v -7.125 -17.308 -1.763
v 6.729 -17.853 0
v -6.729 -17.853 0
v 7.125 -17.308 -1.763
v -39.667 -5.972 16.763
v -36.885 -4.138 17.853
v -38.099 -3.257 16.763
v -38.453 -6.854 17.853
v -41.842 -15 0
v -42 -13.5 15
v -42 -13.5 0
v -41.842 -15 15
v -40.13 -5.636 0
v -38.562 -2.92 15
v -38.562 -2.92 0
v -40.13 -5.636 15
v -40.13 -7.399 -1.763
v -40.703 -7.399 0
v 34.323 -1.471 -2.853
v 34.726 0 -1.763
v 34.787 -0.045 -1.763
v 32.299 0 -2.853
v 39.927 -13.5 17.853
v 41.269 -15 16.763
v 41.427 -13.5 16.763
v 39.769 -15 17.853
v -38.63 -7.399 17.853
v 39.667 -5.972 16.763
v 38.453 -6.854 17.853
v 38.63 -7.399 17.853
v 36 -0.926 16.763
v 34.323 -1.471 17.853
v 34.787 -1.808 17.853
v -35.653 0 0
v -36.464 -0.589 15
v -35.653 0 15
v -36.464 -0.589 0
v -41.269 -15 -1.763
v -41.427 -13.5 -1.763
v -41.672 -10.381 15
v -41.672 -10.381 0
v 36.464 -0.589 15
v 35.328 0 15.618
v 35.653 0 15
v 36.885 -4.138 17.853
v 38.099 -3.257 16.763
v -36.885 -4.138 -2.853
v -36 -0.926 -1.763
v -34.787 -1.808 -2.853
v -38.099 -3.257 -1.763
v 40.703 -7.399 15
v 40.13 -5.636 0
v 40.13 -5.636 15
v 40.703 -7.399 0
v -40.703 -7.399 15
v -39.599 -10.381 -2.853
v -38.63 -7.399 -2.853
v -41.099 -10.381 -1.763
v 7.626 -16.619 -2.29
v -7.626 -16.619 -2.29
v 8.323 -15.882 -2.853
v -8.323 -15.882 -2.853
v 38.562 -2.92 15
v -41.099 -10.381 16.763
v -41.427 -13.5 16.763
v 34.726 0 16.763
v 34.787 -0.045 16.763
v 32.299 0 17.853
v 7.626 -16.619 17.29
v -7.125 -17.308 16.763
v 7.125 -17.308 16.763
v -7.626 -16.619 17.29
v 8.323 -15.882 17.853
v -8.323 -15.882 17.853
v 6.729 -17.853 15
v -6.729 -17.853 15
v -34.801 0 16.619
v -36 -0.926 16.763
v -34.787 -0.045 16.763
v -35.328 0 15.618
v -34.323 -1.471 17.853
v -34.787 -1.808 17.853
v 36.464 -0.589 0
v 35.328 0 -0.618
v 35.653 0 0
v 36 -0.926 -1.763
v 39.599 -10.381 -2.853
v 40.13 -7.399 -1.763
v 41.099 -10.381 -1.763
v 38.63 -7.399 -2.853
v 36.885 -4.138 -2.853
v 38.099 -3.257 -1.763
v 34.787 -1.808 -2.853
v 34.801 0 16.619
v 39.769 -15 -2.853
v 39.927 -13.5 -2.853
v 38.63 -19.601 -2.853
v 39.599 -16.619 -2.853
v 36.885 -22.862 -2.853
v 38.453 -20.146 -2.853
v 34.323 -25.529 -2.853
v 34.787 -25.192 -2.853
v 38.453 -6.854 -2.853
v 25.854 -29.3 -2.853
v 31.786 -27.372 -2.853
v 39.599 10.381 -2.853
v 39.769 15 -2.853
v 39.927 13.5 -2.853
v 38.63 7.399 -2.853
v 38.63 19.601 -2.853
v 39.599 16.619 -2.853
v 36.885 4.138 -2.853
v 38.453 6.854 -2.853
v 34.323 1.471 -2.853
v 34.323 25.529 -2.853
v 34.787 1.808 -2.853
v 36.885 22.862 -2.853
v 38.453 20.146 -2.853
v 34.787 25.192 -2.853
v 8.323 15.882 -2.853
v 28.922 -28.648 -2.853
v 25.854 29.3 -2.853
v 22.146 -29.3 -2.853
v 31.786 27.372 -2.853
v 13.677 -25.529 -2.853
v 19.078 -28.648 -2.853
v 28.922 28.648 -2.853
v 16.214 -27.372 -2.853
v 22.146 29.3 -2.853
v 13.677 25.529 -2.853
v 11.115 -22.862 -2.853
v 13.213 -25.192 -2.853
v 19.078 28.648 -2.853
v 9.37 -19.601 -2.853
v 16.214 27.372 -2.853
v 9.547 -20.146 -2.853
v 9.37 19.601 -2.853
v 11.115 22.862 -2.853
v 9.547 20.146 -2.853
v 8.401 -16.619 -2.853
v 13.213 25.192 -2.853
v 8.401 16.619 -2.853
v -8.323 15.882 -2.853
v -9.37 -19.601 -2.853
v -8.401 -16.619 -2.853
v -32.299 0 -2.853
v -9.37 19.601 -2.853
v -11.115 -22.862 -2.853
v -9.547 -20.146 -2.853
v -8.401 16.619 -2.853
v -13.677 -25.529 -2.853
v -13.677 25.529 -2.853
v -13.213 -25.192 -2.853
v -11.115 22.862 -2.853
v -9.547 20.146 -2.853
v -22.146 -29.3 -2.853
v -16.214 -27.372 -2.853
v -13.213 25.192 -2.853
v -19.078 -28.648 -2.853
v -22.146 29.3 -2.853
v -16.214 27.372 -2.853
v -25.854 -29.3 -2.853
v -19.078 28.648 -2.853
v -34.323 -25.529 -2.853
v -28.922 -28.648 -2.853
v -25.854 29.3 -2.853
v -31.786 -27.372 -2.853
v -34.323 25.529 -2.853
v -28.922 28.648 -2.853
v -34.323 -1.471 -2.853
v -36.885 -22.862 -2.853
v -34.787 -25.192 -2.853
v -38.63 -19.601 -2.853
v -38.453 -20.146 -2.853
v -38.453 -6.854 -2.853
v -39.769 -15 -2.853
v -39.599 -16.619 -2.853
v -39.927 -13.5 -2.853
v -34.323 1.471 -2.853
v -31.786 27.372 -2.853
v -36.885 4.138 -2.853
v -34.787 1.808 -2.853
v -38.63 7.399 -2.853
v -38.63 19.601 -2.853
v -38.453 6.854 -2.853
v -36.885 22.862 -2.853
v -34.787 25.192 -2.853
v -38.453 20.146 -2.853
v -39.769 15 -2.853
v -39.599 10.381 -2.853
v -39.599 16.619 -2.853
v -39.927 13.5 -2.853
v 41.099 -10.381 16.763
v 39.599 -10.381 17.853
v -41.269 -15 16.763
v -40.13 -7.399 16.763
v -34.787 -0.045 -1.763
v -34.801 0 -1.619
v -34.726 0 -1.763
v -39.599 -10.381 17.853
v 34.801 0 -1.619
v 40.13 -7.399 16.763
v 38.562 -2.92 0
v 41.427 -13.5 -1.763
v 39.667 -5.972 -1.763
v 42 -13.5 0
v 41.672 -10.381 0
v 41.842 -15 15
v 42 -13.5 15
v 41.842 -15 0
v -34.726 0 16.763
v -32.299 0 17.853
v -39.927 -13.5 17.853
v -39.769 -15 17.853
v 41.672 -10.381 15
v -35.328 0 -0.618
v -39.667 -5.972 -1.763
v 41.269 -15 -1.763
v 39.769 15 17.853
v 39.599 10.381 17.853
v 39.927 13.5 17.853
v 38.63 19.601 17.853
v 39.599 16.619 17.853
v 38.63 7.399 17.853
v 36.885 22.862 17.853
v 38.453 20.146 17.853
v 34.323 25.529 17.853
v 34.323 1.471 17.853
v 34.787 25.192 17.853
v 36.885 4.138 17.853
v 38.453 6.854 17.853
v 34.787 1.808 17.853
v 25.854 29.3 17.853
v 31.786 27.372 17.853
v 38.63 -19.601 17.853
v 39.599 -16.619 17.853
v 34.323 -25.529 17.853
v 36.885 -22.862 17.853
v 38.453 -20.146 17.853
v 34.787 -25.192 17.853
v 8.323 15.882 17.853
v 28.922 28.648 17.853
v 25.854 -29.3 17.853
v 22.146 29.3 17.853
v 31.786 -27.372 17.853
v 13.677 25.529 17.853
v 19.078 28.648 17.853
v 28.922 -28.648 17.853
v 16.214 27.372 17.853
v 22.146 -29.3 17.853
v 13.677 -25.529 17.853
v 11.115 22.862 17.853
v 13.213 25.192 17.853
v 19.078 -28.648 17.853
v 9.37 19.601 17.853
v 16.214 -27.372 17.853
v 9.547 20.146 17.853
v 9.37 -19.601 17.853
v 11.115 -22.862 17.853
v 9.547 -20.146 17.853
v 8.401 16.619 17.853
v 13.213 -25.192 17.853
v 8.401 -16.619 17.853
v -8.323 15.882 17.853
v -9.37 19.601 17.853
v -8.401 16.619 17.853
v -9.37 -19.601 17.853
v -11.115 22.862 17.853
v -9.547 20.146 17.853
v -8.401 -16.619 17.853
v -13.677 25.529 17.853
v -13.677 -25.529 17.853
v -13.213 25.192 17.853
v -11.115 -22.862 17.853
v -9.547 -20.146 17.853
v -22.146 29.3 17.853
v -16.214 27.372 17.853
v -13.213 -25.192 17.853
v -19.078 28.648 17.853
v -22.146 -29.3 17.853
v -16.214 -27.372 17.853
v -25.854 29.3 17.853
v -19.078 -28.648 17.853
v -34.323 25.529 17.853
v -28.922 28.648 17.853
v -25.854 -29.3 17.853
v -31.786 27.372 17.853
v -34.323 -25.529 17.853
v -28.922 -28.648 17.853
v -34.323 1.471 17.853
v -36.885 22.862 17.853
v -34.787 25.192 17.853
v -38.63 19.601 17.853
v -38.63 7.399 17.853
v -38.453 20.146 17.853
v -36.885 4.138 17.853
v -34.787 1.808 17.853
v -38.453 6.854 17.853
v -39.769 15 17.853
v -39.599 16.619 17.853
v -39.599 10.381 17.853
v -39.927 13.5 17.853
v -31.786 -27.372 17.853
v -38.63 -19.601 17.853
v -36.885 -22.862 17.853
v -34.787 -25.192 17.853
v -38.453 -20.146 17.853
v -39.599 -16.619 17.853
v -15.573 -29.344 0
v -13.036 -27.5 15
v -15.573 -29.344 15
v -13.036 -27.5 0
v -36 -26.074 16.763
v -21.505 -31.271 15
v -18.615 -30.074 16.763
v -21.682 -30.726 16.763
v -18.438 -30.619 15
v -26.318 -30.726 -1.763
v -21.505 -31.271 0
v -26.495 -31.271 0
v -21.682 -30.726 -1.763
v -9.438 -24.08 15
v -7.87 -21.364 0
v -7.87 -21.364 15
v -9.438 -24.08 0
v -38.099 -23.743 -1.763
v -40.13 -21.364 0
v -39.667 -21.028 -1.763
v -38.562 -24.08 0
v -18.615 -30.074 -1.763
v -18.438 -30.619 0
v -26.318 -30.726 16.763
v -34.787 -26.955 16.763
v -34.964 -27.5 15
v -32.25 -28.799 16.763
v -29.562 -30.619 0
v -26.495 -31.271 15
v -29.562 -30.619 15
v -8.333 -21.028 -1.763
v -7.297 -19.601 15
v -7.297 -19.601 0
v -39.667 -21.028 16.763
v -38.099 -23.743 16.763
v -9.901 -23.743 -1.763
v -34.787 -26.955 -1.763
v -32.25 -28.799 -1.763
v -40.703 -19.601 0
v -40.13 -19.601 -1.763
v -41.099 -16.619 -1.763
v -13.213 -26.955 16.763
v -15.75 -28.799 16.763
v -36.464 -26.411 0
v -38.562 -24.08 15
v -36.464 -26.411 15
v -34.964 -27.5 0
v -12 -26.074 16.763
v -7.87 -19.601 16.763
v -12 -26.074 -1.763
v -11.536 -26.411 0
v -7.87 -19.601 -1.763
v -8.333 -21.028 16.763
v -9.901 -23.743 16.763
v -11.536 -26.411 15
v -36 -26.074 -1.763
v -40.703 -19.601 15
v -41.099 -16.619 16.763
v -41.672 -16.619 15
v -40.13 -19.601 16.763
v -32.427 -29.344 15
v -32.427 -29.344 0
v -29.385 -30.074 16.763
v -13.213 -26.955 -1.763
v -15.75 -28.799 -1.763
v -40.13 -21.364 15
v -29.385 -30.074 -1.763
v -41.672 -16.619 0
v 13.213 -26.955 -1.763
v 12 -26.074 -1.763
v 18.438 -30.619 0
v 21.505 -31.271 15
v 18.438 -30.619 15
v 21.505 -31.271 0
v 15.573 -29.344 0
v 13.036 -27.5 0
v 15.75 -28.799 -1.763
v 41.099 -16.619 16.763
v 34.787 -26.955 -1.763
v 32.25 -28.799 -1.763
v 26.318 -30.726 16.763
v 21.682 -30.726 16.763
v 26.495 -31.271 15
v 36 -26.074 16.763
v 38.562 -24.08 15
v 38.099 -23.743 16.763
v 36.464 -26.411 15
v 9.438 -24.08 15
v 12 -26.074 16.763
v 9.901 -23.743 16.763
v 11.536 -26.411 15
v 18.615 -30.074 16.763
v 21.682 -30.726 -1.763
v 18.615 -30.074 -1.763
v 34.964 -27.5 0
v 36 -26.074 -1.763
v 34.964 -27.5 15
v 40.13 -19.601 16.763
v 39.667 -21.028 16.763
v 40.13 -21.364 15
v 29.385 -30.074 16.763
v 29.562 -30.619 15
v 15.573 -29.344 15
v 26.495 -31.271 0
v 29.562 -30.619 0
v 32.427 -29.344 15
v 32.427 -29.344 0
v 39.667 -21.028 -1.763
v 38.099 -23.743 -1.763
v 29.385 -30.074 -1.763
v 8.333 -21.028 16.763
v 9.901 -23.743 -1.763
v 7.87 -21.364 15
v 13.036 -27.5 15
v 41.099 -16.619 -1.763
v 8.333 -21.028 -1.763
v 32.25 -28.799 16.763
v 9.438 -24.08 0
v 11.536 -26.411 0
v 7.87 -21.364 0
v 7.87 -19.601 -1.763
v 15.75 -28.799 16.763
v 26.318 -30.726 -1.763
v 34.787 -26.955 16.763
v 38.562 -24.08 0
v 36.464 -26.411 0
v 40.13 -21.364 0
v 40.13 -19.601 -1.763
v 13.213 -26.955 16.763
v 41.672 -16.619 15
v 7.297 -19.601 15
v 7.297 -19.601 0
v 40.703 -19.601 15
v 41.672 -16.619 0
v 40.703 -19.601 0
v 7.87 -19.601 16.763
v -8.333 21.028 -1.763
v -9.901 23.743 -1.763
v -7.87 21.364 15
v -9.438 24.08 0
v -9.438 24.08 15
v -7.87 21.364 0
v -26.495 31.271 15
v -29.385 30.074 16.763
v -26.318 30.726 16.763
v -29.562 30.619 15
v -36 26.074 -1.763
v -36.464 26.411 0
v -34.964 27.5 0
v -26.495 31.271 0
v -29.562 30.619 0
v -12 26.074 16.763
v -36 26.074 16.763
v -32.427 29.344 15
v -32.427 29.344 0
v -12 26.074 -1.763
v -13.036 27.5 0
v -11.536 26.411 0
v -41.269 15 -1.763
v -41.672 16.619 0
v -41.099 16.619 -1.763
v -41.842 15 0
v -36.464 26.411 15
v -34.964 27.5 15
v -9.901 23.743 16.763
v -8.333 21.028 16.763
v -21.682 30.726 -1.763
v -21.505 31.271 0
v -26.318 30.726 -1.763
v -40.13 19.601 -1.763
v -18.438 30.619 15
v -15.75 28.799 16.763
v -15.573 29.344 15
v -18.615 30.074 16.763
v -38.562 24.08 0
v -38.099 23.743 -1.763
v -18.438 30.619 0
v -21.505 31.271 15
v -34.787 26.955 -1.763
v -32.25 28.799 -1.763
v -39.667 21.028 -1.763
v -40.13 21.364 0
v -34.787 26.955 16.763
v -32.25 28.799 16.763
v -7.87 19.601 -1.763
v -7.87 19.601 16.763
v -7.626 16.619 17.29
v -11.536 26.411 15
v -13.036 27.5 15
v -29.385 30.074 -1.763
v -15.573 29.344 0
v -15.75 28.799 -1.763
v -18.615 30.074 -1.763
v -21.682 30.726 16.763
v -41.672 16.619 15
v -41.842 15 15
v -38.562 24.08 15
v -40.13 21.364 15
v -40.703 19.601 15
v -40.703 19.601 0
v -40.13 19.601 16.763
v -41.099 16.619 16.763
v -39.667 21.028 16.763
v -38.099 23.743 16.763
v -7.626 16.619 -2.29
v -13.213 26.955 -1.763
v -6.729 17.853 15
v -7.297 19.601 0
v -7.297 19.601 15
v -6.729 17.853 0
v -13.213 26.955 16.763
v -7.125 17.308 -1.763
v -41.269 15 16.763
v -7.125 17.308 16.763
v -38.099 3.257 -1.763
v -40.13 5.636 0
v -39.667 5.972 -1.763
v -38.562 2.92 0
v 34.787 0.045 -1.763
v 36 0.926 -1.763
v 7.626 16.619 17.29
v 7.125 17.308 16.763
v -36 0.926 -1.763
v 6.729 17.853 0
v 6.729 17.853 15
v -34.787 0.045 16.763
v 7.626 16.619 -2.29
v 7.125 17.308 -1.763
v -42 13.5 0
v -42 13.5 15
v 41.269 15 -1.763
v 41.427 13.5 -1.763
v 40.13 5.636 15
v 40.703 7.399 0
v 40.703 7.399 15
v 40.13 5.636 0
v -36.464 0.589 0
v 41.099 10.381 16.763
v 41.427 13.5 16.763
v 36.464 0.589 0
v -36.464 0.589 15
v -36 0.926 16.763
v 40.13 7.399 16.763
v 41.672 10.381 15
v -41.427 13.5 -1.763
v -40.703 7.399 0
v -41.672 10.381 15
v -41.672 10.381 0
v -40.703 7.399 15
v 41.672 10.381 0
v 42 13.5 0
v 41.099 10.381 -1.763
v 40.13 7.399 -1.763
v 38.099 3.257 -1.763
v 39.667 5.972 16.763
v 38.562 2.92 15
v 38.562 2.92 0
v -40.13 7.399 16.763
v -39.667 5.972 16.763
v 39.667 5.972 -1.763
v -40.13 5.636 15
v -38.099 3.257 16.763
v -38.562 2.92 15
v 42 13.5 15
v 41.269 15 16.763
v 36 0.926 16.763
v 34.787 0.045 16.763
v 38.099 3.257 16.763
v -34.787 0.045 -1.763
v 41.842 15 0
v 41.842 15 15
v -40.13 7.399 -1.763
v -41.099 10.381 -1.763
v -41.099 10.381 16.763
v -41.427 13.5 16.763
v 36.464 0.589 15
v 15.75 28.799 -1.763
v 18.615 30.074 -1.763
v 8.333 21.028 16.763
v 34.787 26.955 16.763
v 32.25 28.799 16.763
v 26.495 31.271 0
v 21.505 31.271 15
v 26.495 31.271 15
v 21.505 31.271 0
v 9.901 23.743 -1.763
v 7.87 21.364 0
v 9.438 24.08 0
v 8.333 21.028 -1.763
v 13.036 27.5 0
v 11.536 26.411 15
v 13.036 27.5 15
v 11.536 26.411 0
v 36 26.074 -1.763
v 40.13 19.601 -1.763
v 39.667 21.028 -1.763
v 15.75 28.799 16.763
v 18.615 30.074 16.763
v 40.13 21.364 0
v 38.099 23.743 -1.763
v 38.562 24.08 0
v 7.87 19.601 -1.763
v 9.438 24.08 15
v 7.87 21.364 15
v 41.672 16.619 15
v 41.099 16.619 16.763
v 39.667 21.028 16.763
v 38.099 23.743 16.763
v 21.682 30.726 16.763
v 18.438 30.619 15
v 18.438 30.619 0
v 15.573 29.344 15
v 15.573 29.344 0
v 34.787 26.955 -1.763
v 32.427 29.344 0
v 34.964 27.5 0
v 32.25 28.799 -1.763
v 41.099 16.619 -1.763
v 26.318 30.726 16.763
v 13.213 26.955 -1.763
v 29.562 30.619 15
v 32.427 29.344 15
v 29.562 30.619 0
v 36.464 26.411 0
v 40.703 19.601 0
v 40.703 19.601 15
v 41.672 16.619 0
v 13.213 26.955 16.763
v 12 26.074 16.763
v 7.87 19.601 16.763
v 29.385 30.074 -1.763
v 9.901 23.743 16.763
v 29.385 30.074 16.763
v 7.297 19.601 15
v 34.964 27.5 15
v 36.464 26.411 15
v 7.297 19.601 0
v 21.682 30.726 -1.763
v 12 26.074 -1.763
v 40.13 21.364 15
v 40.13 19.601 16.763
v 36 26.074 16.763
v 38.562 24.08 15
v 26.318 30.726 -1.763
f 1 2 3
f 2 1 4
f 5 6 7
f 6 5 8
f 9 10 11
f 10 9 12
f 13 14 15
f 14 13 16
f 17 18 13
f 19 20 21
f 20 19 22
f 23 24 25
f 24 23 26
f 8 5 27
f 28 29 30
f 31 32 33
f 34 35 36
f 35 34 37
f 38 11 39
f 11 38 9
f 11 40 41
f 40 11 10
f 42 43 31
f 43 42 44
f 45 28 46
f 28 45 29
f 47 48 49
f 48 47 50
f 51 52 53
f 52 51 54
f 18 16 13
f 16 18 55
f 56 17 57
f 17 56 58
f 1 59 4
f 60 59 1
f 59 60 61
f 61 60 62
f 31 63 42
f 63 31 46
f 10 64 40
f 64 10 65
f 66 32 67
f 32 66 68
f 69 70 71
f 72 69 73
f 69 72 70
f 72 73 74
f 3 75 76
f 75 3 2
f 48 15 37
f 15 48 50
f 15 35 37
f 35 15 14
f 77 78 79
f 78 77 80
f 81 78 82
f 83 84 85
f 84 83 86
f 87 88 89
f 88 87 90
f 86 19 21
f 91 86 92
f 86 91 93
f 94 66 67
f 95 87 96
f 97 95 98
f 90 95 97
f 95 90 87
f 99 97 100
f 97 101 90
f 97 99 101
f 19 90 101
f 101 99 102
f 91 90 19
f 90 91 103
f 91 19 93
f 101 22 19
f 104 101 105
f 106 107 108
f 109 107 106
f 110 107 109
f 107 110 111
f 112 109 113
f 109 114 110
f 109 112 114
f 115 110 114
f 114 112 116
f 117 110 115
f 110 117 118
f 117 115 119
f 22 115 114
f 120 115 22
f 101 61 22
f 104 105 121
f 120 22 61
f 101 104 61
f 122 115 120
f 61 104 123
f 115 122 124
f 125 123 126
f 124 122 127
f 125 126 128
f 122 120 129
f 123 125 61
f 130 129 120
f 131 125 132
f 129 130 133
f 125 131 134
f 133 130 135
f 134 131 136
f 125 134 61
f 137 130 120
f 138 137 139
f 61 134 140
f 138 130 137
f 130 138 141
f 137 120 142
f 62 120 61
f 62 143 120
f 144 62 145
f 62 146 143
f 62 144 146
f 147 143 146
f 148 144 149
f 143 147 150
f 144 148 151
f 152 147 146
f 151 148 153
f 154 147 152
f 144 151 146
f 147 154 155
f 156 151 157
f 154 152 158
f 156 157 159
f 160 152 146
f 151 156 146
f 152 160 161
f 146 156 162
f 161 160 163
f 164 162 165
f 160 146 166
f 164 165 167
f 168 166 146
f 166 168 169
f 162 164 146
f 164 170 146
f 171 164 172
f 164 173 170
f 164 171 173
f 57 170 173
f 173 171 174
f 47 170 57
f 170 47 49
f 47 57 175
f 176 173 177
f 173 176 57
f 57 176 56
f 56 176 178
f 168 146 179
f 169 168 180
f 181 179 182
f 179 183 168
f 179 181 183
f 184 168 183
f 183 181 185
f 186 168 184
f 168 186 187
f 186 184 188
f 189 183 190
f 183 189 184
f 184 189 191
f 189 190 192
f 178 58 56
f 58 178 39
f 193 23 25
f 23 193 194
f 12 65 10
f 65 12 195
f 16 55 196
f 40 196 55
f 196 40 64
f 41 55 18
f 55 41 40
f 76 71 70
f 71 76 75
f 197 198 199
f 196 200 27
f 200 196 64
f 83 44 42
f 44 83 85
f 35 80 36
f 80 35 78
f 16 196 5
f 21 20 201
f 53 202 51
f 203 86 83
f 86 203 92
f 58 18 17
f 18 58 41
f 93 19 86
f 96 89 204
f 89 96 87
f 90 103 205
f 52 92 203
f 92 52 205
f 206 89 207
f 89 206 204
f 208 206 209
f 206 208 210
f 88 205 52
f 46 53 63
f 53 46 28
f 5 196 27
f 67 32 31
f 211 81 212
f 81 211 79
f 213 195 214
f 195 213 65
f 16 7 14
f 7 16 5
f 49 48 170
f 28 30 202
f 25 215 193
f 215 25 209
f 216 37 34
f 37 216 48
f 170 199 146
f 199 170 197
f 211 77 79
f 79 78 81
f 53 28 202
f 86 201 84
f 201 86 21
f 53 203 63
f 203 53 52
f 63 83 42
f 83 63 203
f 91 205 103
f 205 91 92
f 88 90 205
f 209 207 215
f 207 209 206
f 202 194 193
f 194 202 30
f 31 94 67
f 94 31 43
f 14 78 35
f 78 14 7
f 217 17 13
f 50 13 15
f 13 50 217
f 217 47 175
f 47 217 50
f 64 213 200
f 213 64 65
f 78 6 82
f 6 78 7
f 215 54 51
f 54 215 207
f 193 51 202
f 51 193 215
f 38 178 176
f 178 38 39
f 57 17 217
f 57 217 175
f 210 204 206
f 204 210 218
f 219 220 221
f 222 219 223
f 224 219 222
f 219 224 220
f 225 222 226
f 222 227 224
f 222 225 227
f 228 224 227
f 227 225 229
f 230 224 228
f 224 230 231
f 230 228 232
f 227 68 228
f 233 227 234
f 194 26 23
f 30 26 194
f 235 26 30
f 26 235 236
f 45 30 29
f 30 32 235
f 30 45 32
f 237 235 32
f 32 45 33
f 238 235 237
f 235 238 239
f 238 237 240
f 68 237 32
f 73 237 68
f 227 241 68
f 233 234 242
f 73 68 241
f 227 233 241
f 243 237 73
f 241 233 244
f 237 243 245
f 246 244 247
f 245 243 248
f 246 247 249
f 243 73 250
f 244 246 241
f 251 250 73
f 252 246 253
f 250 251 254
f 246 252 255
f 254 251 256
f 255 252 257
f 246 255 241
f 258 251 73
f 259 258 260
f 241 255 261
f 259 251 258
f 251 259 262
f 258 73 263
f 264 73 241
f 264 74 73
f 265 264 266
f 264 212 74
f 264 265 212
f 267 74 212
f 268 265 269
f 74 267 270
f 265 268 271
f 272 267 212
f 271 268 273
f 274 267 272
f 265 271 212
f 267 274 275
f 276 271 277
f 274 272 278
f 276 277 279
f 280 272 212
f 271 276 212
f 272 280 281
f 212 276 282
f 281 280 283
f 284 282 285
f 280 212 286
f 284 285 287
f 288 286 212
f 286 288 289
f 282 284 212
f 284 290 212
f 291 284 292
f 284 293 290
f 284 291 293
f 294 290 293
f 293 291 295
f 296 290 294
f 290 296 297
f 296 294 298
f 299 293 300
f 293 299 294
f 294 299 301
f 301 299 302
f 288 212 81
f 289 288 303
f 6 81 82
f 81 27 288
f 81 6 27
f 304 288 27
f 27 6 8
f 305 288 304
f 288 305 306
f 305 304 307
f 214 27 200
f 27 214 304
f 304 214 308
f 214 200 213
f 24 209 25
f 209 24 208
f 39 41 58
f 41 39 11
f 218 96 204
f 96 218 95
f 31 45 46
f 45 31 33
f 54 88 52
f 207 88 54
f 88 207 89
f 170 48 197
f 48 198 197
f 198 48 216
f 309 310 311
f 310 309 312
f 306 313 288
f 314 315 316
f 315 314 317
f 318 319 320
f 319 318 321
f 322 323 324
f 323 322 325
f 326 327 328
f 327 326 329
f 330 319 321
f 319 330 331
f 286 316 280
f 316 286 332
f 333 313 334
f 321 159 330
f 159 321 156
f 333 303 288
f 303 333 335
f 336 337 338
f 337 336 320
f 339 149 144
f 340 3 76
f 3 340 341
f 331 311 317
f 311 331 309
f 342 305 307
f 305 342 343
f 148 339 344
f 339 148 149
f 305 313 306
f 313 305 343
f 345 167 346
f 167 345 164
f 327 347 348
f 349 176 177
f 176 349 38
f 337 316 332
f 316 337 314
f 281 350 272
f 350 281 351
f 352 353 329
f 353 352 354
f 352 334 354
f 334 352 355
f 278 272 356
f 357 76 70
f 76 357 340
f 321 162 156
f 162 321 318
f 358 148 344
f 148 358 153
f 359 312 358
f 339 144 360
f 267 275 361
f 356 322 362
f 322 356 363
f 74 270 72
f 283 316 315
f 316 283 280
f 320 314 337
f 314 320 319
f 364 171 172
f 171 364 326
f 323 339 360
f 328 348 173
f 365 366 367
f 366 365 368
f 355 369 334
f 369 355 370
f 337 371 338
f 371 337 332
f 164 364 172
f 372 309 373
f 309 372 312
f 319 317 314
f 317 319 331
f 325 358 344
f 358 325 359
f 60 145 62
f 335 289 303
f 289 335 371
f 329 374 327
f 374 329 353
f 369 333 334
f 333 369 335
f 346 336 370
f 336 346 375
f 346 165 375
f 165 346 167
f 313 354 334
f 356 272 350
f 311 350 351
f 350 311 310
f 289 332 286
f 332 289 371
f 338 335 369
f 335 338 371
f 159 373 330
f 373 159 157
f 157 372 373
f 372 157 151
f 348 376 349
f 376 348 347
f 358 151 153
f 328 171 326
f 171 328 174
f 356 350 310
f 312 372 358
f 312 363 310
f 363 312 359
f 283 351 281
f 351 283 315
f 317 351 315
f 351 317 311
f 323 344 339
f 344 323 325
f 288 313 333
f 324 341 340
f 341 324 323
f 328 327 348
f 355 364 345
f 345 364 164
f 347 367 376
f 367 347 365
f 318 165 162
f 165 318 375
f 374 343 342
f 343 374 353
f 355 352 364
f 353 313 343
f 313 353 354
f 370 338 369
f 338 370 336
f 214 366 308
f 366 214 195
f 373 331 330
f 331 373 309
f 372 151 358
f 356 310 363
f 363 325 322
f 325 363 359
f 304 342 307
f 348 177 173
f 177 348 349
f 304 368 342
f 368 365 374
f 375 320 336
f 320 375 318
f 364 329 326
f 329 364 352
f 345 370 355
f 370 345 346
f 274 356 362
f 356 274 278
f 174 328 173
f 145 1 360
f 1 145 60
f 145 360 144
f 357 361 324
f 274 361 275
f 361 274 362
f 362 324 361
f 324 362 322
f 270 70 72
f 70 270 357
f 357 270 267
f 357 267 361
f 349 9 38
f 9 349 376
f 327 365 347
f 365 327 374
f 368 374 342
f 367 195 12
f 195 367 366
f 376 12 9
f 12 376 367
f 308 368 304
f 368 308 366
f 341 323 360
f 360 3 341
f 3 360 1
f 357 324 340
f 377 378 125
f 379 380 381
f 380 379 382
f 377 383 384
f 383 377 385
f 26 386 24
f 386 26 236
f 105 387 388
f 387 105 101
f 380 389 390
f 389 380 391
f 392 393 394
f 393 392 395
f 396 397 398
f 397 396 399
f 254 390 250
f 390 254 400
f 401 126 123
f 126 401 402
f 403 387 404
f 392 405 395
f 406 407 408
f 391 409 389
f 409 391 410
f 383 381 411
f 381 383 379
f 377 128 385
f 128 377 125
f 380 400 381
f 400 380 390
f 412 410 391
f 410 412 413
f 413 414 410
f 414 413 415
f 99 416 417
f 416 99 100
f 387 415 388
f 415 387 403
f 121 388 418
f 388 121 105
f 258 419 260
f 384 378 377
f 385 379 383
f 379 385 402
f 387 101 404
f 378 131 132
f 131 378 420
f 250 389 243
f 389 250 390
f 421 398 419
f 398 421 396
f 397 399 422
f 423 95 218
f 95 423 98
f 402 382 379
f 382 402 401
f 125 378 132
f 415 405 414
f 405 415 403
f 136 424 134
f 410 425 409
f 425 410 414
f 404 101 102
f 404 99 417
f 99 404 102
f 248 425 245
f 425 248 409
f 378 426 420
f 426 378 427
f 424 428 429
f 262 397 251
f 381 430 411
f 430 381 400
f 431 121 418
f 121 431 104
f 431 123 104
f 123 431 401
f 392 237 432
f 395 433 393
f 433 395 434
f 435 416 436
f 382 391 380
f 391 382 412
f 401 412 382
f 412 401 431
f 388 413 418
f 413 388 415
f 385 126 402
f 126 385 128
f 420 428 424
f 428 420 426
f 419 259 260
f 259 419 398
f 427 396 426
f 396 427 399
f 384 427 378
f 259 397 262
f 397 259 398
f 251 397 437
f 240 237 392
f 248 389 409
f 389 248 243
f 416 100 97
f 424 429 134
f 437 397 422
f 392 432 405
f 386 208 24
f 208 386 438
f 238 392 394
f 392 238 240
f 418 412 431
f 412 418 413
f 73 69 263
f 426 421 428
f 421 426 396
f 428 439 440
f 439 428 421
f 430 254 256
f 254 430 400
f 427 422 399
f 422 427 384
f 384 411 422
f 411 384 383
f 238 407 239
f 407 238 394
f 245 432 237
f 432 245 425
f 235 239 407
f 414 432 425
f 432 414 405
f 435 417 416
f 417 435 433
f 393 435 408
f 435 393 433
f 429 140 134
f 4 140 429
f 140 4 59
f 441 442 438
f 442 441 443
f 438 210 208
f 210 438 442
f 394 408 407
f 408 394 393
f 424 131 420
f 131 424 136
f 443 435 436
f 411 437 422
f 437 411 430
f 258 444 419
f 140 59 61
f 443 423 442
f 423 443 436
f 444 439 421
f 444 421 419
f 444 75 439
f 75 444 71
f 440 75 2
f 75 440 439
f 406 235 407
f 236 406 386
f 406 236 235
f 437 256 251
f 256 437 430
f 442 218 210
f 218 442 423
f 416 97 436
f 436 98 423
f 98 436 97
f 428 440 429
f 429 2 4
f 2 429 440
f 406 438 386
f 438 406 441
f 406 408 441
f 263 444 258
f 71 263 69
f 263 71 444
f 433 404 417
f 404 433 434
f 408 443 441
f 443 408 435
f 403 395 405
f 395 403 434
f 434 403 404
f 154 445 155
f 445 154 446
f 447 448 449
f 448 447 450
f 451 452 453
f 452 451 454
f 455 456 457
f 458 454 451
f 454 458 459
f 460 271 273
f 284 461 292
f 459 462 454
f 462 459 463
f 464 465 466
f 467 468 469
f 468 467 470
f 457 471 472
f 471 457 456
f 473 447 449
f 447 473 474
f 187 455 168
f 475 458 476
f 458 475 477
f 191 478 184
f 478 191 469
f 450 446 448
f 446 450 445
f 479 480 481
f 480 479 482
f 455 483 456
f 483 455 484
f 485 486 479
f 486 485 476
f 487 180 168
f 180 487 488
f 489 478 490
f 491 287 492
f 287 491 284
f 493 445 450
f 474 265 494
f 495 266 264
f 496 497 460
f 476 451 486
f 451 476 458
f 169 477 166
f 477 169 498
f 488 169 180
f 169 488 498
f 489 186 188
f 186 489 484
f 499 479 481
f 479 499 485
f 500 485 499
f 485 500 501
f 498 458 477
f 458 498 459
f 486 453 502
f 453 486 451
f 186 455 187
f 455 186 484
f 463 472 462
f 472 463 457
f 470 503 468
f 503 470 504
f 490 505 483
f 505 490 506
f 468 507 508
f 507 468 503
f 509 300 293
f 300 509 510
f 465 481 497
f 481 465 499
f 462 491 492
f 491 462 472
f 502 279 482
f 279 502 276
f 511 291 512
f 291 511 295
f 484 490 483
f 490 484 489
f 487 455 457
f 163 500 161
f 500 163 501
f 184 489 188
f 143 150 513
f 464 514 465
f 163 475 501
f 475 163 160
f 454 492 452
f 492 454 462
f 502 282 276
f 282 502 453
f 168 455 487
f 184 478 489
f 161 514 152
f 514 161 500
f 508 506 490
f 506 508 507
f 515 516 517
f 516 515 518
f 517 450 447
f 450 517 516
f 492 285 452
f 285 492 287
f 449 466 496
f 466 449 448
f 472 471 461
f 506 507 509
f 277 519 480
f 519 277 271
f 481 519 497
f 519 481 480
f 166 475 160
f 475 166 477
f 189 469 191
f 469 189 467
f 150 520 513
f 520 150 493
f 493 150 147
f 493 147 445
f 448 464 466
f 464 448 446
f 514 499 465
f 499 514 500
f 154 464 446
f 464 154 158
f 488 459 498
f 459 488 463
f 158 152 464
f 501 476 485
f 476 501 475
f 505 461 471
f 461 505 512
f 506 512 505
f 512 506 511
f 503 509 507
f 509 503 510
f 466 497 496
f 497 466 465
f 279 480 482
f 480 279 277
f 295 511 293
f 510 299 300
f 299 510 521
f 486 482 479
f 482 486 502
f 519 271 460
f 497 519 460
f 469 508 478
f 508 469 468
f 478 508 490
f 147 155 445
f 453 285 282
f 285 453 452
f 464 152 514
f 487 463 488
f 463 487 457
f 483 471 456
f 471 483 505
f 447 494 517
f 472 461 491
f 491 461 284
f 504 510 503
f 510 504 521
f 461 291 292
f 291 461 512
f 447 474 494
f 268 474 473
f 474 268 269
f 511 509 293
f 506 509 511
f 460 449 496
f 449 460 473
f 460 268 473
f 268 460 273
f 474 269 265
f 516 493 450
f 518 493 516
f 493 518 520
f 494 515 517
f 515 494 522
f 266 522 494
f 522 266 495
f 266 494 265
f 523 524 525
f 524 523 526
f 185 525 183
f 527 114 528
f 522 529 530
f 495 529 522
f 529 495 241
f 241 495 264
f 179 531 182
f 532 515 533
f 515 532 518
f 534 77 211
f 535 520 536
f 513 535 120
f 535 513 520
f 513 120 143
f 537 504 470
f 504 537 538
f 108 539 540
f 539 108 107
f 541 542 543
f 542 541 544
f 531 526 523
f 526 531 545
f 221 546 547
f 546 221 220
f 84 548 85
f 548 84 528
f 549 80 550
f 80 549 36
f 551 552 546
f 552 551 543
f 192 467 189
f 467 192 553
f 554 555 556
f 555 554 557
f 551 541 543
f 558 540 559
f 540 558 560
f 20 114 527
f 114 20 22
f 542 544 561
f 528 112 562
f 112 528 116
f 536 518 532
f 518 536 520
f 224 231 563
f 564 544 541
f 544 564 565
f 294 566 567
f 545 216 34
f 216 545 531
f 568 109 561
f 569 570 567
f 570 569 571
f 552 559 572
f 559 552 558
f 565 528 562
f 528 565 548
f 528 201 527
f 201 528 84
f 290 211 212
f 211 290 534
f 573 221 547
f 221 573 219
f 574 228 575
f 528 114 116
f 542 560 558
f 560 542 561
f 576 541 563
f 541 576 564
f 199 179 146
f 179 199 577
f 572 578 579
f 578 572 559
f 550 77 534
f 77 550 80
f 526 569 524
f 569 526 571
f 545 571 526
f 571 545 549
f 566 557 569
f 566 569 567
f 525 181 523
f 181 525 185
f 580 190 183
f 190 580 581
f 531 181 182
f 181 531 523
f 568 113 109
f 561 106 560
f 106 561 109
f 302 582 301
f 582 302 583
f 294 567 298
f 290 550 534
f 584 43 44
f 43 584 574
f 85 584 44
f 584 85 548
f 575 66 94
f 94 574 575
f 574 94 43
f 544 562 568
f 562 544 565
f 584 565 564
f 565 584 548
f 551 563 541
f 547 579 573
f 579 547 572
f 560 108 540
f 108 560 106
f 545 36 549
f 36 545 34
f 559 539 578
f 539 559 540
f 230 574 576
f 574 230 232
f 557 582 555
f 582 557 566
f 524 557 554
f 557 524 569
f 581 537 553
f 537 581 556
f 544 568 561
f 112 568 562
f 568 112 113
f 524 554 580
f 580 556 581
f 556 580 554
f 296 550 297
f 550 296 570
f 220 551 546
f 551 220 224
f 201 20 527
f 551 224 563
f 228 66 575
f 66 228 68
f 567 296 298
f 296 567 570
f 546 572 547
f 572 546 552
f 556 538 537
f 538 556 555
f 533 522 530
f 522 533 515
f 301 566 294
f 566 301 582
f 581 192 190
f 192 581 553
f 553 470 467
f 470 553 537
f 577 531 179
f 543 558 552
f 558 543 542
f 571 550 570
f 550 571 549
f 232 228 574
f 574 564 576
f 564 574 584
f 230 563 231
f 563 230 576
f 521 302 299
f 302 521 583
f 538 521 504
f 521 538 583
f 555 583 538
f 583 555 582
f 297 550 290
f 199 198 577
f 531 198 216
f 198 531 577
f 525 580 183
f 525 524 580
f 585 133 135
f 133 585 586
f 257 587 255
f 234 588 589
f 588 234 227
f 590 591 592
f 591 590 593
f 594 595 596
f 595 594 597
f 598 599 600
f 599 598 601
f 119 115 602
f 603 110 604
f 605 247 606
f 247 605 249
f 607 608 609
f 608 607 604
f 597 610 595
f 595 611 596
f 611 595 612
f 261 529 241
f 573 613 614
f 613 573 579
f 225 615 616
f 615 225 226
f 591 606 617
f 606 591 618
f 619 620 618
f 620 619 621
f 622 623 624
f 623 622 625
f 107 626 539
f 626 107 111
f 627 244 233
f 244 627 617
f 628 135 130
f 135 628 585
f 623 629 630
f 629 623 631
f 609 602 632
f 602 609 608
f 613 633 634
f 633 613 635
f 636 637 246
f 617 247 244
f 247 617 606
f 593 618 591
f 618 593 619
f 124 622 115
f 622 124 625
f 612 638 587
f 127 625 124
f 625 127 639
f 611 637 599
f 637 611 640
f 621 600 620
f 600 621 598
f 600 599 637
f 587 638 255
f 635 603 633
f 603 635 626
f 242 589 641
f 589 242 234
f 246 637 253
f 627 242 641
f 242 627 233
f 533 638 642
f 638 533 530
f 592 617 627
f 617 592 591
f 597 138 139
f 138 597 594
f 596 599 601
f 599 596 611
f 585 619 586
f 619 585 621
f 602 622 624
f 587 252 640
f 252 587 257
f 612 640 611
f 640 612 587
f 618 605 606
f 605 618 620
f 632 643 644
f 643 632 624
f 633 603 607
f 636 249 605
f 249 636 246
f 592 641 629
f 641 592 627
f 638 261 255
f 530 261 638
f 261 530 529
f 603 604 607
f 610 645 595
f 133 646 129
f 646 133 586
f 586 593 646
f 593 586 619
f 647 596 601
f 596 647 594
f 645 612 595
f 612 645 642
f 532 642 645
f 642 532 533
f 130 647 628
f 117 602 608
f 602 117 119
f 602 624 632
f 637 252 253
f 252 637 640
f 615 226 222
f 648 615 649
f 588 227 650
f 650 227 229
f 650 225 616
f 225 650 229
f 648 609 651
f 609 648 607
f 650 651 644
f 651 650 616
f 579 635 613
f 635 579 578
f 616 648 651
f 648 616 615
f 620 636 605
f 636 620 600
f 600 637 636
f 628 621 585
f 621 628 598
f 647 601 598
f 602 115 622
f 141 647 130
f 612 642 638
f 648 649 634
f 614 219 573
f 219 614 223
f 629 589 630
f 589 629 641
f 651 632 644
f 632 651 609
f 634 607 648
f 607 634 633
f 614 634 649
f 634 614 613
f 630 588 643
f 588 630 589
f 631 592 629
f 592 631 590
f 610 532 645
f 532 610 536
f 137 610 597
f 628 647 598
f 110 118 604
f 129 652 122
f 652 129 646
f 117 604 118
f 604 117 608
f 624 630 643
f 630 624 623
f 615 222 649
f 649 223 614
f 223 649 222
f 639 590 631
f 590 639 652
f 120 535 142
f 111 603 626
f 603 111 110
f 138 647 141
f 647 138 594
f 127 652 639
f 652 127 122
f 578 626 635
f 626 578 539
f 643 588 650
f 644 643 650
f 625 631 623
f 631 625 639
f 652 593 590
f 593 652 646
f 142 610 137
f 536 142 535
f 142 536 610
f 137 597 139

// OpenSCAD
bone_dia = 30;
height = 15;

module bone() {
for (y = [-1, 1]) {
for (x = [-1, 1]) {
translate([x * bone_dia * 0.5 * 1.6, y * bone_dia * 0.45, 0])
cylinder(r=bone_dia/2, h=height);
}
}
translate([0, 0, height/2])
cube([1.5*bone_dia, bone_dia, height], center=true);
}

minkowski() {
	bone();
	sphere(3);
}
